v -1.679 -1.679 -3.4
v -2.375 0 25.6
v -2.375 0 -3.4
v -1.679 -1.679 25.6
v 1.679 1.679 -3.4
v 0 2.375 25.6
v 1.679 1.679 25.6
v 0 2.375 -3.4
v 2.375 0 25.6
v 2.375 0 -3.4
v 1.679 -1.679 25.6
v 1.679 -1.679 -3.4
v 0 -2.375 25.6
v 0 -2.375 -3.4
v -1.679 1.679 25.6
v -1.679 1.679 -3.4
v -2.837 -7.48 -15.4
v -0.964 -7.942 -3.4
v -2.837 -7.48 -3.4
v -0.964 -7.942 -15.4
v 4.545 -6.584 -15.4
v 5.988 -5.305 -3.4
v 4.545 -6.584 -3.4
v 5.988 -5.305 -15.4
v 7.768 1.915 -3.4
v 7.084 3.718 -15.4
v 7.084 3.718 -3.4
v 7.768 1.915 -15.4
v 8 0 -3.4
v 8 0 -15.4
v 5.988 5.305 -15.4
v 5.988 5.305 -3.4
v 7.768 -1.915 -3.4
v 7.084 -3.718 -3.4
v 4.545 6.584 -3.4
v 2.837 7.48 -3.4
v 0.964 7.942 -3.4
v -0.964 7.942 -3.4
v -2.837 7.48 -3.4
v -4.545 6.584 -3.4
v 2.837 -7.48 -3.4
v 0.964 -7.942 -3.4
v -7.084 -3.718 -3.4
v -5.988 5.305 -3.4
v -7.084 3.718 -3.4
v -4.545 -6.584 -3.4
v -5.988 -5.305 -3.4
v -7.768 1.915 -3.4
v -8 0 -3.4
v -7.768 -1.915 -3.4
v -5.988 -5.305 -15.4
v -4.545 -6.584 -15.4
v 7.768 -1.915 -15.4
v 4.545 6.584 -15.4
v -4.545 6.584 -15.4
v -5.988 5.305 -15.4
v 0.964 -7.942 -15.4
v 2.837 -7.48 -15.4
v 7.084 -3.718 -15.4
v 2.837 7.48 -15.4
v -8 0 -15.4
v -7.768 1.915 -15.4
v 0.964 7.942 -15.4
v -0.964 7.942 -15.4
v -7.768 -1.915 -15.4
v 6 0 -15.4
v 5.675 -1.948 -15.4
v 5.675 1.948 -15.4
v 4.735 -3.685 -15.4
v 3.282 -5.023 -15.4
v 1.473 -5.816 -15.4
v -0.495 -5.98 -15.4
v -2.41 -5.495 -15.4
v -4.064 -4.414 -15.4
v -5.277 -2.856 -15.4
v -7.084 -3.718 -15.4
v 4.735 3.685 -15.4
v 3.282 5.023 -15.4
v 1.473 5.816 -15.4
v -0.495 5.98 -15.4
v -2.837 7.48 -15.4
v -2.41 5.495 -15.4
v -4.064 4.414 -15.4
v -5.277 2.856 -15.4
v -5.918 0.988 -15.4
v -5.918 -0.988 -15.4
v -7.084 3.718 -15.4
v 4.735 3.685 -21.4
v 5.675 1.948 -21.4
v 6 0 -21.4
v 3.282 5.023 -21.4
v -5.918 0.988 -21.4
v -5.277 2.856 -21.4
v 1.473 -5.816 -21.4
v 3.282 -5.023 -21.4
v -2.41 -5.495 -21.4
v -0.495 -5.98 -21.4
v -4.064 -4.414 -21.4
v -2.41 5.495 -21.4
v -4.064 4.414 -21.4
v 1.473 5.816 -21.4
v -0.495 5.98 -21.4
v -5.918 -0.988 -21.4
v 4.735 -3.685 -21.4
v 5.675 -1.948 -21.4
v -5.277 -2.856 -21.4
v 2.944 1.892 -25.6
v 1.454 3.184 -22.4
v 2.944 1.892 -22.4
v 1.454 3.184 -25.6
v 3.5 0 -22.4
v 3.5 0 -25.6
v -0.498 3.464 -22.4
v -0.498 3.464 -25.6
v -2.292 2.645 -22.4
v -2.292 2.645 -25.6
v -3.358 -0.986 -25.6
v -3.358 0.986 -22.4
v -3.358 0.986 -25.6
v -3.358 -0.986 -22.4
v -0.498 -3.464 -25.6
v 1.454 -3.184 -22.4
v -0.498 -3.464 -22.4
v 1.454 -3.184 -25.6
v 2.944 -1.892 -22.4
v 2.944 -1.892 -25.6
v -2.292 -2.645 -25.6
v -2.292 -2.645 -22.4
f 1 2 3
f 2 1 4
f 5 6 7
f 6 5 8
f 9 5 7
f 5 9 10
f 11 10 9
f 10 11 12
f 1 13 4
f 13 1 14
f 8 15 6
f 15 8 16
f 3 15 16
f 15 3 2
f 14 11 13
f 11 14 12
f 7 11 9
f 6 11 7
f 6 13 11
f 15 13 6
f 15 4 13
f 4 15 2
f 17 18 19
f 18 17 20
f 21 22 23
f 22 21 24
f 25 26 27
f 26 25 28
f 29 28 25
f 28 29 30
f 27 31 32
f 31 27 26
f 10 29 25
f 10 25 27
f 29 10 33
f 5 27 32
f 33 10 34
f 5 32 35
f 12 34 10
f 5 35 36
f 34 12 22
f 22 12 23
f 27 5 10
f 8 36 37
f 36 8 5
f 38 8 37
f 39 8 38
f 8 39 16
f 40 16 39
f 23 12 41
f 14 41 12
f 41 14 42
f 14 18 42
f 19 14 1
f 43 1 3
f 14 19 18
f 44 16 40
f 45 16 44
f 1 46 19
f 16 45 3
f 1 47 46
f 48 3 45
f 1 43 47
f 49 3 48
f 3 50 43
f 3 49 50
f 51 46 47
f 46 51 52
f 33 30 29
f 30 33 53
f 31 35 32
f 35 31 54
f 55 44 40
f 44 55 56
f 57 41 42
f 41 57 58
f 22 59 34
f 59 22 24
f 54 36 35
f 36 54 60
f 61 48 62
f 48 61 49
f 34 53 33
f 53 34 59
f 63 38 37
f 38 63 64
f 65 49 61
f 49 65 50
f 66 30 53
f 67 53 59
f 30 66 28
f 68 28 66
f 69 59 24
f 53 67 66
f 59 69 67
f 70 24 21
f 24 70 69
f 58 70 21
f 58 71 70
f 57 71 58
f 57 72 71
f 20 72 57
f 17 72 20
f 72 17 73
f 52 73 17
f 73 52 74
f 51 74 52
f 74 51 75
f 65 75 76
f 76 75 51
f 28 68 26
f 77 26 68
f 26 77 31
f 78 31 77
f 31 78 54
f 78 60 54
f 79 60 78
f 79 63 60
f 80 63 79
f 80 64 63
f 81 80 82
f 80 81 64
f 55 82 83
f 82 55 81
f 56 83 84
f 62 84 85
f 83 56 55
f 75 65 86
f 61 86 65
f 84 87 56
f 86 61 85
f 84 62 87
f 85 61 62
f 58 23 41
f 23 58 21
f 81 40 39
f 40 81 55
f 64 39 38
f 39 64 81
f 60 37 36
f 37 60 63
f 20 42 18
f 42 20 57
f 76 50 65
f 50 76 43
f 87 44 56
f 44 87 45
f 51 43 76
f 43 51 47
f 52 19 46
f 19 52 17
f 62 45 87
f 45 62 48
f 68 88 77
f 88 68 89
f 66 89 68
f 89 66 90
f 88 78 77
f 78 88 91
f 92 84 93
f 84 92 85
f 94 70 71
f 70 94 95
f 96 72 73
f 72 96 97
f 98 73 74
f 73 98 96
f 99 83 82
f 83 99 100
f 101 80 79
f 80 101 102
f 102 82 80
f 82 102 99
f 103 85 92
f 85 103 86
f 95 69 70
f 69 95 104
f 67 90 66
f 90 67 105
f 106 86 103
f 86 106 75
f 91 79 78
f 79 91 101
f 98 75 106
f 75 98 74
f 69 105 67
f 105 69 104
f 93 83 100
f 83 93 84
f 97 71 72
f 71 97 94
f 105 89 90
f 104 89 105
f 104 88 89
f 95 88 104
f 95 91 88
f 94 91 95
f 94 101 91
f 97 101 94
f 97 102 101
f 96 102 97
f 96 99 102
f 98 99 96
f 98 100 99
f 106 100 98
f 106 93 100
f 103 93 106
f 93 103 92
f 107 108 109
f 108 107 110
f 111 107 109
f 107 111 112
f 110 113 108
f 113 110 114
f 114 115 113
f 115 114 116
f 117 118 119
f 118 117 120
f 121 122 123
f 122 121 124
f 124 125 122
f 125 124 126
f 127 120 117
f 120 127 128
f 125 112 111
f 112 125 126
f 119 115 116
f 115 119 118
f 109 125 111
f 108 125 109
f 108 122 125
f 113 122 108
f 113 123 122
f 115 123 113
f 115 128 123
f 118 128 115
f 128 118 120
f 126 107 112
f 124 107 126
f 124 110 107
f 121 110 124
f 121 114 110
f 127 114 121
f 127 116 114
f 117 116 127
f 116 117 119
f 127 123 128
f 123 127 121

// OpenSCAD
// Parameters
total_length_mm = 51.2; //[25.6:102.4:0.1]
barrel_diameter_mm = 4.75; //[2.4:9.5:0.05]
filament_diameter_mm = 1.75; //[1.0:3.0:0.05]
filament_clearance_mm = 0.2; //[0.0:0.6:0.05]
filament_bore_diameter_mm = 1.95; //[1.6:2.6:0.05]
overlap_mm = 1.0; //[0.5:2.0:0.1]
barrel_length_mm = 30.0; //[15.0:60.0:0.1]
mount_length_mm = 12.0; //[6.0:24.0:0.1]
heater_interface_length_mm = 6.0; //[3.0:12.0:0.1]
nozzle_interface_length_mm = 3.2; //[1.6:8.0:0.1]
mount_diameter_mm = 16.0; //[8.0:32.0:0.1]
heater_interface_diameter_mm = 12.0; //[6.0:24.0:0.1]
nozzle_interface_diameter_mm = 7.0; //[3.5:14.0:0.1]
groove_diameter_mm = 12.0; //[6.0:24.0:0.1]
groove_width_mm = 3.0; //[1.0:8.0:0.1]

// Hot End - complete geometry
module hot_end() {
  color("Silver") {
    union() {
      // Barrel/Heatbreak
      translate([0, 0, total_length_mm/2 - barrel_length_mm/2])
        cylinder(r=barrel_diameter_mm/2, h=barrel_length_mm, center=true);
      
      // Mounting Groove/Clamp Section
      translate([0, 0, total_length_mm/2 - barrel_length_mm - mount_length_mm/2 + overlap_mm])
        cylinder(r=mount_diameter_mm/2, h=mount_length_mm, center=true);
      
      // Heater Block Interface
      translate([0, 0, total_length_mm/2 - barrel_length_mm - mount_length_mm - heater_interface_length_mm/2 + overlap_mm])
        cylinder(r=heater_interface_diameter_mm/2, h=heater_interface_length_mm, center=true);
      
      // Nozzle Interface
      translate([0, 0, -total_length_mm/2 + nozzle_interface_length_mm/2])
        cylinder(r=nozzle_interface_diameter_mm/2, h=nozzle_interface_length_mm, center=true);
    }
  }
}

// Jhead Hot End - complete geometry
module jhead_hot_end() {
  color("DimGray") {
    // Similar structure to hot_end with specific details
    hot_end();
  }
}

// E3D Hot End Assembly - complete geometry
module e3d_hot_end_assembly() {
  color("Black") {
    // Similar structure to hot_end with specific details
    hot_end();
  }
}

// Jhead Hot End Assembly - complete geometry
module jhead_hot_end_assembly() {
  color("DimGray") {
    // Similar structure to hot_end with specific details
    hot_end();
  }
}

// E3D Hot End - complete geometry
module e3d_hot_end() {
  color("Black") {
    // Similar structure to hot_end with specific details
    hot_end();
  }
}

// Assembly
module assembly() {
  // Combine all parts
  hot_end();
  translate([0, 0, 0]) jhead_hot_end();
  translate([0, 0, 0]) e3d_hot_end_assembly();
  translate([0, 0, 0]) jhead_hot_end_assembly();
  translate([0, 0, 0]) e3d_hot_end();
}

assembly();
